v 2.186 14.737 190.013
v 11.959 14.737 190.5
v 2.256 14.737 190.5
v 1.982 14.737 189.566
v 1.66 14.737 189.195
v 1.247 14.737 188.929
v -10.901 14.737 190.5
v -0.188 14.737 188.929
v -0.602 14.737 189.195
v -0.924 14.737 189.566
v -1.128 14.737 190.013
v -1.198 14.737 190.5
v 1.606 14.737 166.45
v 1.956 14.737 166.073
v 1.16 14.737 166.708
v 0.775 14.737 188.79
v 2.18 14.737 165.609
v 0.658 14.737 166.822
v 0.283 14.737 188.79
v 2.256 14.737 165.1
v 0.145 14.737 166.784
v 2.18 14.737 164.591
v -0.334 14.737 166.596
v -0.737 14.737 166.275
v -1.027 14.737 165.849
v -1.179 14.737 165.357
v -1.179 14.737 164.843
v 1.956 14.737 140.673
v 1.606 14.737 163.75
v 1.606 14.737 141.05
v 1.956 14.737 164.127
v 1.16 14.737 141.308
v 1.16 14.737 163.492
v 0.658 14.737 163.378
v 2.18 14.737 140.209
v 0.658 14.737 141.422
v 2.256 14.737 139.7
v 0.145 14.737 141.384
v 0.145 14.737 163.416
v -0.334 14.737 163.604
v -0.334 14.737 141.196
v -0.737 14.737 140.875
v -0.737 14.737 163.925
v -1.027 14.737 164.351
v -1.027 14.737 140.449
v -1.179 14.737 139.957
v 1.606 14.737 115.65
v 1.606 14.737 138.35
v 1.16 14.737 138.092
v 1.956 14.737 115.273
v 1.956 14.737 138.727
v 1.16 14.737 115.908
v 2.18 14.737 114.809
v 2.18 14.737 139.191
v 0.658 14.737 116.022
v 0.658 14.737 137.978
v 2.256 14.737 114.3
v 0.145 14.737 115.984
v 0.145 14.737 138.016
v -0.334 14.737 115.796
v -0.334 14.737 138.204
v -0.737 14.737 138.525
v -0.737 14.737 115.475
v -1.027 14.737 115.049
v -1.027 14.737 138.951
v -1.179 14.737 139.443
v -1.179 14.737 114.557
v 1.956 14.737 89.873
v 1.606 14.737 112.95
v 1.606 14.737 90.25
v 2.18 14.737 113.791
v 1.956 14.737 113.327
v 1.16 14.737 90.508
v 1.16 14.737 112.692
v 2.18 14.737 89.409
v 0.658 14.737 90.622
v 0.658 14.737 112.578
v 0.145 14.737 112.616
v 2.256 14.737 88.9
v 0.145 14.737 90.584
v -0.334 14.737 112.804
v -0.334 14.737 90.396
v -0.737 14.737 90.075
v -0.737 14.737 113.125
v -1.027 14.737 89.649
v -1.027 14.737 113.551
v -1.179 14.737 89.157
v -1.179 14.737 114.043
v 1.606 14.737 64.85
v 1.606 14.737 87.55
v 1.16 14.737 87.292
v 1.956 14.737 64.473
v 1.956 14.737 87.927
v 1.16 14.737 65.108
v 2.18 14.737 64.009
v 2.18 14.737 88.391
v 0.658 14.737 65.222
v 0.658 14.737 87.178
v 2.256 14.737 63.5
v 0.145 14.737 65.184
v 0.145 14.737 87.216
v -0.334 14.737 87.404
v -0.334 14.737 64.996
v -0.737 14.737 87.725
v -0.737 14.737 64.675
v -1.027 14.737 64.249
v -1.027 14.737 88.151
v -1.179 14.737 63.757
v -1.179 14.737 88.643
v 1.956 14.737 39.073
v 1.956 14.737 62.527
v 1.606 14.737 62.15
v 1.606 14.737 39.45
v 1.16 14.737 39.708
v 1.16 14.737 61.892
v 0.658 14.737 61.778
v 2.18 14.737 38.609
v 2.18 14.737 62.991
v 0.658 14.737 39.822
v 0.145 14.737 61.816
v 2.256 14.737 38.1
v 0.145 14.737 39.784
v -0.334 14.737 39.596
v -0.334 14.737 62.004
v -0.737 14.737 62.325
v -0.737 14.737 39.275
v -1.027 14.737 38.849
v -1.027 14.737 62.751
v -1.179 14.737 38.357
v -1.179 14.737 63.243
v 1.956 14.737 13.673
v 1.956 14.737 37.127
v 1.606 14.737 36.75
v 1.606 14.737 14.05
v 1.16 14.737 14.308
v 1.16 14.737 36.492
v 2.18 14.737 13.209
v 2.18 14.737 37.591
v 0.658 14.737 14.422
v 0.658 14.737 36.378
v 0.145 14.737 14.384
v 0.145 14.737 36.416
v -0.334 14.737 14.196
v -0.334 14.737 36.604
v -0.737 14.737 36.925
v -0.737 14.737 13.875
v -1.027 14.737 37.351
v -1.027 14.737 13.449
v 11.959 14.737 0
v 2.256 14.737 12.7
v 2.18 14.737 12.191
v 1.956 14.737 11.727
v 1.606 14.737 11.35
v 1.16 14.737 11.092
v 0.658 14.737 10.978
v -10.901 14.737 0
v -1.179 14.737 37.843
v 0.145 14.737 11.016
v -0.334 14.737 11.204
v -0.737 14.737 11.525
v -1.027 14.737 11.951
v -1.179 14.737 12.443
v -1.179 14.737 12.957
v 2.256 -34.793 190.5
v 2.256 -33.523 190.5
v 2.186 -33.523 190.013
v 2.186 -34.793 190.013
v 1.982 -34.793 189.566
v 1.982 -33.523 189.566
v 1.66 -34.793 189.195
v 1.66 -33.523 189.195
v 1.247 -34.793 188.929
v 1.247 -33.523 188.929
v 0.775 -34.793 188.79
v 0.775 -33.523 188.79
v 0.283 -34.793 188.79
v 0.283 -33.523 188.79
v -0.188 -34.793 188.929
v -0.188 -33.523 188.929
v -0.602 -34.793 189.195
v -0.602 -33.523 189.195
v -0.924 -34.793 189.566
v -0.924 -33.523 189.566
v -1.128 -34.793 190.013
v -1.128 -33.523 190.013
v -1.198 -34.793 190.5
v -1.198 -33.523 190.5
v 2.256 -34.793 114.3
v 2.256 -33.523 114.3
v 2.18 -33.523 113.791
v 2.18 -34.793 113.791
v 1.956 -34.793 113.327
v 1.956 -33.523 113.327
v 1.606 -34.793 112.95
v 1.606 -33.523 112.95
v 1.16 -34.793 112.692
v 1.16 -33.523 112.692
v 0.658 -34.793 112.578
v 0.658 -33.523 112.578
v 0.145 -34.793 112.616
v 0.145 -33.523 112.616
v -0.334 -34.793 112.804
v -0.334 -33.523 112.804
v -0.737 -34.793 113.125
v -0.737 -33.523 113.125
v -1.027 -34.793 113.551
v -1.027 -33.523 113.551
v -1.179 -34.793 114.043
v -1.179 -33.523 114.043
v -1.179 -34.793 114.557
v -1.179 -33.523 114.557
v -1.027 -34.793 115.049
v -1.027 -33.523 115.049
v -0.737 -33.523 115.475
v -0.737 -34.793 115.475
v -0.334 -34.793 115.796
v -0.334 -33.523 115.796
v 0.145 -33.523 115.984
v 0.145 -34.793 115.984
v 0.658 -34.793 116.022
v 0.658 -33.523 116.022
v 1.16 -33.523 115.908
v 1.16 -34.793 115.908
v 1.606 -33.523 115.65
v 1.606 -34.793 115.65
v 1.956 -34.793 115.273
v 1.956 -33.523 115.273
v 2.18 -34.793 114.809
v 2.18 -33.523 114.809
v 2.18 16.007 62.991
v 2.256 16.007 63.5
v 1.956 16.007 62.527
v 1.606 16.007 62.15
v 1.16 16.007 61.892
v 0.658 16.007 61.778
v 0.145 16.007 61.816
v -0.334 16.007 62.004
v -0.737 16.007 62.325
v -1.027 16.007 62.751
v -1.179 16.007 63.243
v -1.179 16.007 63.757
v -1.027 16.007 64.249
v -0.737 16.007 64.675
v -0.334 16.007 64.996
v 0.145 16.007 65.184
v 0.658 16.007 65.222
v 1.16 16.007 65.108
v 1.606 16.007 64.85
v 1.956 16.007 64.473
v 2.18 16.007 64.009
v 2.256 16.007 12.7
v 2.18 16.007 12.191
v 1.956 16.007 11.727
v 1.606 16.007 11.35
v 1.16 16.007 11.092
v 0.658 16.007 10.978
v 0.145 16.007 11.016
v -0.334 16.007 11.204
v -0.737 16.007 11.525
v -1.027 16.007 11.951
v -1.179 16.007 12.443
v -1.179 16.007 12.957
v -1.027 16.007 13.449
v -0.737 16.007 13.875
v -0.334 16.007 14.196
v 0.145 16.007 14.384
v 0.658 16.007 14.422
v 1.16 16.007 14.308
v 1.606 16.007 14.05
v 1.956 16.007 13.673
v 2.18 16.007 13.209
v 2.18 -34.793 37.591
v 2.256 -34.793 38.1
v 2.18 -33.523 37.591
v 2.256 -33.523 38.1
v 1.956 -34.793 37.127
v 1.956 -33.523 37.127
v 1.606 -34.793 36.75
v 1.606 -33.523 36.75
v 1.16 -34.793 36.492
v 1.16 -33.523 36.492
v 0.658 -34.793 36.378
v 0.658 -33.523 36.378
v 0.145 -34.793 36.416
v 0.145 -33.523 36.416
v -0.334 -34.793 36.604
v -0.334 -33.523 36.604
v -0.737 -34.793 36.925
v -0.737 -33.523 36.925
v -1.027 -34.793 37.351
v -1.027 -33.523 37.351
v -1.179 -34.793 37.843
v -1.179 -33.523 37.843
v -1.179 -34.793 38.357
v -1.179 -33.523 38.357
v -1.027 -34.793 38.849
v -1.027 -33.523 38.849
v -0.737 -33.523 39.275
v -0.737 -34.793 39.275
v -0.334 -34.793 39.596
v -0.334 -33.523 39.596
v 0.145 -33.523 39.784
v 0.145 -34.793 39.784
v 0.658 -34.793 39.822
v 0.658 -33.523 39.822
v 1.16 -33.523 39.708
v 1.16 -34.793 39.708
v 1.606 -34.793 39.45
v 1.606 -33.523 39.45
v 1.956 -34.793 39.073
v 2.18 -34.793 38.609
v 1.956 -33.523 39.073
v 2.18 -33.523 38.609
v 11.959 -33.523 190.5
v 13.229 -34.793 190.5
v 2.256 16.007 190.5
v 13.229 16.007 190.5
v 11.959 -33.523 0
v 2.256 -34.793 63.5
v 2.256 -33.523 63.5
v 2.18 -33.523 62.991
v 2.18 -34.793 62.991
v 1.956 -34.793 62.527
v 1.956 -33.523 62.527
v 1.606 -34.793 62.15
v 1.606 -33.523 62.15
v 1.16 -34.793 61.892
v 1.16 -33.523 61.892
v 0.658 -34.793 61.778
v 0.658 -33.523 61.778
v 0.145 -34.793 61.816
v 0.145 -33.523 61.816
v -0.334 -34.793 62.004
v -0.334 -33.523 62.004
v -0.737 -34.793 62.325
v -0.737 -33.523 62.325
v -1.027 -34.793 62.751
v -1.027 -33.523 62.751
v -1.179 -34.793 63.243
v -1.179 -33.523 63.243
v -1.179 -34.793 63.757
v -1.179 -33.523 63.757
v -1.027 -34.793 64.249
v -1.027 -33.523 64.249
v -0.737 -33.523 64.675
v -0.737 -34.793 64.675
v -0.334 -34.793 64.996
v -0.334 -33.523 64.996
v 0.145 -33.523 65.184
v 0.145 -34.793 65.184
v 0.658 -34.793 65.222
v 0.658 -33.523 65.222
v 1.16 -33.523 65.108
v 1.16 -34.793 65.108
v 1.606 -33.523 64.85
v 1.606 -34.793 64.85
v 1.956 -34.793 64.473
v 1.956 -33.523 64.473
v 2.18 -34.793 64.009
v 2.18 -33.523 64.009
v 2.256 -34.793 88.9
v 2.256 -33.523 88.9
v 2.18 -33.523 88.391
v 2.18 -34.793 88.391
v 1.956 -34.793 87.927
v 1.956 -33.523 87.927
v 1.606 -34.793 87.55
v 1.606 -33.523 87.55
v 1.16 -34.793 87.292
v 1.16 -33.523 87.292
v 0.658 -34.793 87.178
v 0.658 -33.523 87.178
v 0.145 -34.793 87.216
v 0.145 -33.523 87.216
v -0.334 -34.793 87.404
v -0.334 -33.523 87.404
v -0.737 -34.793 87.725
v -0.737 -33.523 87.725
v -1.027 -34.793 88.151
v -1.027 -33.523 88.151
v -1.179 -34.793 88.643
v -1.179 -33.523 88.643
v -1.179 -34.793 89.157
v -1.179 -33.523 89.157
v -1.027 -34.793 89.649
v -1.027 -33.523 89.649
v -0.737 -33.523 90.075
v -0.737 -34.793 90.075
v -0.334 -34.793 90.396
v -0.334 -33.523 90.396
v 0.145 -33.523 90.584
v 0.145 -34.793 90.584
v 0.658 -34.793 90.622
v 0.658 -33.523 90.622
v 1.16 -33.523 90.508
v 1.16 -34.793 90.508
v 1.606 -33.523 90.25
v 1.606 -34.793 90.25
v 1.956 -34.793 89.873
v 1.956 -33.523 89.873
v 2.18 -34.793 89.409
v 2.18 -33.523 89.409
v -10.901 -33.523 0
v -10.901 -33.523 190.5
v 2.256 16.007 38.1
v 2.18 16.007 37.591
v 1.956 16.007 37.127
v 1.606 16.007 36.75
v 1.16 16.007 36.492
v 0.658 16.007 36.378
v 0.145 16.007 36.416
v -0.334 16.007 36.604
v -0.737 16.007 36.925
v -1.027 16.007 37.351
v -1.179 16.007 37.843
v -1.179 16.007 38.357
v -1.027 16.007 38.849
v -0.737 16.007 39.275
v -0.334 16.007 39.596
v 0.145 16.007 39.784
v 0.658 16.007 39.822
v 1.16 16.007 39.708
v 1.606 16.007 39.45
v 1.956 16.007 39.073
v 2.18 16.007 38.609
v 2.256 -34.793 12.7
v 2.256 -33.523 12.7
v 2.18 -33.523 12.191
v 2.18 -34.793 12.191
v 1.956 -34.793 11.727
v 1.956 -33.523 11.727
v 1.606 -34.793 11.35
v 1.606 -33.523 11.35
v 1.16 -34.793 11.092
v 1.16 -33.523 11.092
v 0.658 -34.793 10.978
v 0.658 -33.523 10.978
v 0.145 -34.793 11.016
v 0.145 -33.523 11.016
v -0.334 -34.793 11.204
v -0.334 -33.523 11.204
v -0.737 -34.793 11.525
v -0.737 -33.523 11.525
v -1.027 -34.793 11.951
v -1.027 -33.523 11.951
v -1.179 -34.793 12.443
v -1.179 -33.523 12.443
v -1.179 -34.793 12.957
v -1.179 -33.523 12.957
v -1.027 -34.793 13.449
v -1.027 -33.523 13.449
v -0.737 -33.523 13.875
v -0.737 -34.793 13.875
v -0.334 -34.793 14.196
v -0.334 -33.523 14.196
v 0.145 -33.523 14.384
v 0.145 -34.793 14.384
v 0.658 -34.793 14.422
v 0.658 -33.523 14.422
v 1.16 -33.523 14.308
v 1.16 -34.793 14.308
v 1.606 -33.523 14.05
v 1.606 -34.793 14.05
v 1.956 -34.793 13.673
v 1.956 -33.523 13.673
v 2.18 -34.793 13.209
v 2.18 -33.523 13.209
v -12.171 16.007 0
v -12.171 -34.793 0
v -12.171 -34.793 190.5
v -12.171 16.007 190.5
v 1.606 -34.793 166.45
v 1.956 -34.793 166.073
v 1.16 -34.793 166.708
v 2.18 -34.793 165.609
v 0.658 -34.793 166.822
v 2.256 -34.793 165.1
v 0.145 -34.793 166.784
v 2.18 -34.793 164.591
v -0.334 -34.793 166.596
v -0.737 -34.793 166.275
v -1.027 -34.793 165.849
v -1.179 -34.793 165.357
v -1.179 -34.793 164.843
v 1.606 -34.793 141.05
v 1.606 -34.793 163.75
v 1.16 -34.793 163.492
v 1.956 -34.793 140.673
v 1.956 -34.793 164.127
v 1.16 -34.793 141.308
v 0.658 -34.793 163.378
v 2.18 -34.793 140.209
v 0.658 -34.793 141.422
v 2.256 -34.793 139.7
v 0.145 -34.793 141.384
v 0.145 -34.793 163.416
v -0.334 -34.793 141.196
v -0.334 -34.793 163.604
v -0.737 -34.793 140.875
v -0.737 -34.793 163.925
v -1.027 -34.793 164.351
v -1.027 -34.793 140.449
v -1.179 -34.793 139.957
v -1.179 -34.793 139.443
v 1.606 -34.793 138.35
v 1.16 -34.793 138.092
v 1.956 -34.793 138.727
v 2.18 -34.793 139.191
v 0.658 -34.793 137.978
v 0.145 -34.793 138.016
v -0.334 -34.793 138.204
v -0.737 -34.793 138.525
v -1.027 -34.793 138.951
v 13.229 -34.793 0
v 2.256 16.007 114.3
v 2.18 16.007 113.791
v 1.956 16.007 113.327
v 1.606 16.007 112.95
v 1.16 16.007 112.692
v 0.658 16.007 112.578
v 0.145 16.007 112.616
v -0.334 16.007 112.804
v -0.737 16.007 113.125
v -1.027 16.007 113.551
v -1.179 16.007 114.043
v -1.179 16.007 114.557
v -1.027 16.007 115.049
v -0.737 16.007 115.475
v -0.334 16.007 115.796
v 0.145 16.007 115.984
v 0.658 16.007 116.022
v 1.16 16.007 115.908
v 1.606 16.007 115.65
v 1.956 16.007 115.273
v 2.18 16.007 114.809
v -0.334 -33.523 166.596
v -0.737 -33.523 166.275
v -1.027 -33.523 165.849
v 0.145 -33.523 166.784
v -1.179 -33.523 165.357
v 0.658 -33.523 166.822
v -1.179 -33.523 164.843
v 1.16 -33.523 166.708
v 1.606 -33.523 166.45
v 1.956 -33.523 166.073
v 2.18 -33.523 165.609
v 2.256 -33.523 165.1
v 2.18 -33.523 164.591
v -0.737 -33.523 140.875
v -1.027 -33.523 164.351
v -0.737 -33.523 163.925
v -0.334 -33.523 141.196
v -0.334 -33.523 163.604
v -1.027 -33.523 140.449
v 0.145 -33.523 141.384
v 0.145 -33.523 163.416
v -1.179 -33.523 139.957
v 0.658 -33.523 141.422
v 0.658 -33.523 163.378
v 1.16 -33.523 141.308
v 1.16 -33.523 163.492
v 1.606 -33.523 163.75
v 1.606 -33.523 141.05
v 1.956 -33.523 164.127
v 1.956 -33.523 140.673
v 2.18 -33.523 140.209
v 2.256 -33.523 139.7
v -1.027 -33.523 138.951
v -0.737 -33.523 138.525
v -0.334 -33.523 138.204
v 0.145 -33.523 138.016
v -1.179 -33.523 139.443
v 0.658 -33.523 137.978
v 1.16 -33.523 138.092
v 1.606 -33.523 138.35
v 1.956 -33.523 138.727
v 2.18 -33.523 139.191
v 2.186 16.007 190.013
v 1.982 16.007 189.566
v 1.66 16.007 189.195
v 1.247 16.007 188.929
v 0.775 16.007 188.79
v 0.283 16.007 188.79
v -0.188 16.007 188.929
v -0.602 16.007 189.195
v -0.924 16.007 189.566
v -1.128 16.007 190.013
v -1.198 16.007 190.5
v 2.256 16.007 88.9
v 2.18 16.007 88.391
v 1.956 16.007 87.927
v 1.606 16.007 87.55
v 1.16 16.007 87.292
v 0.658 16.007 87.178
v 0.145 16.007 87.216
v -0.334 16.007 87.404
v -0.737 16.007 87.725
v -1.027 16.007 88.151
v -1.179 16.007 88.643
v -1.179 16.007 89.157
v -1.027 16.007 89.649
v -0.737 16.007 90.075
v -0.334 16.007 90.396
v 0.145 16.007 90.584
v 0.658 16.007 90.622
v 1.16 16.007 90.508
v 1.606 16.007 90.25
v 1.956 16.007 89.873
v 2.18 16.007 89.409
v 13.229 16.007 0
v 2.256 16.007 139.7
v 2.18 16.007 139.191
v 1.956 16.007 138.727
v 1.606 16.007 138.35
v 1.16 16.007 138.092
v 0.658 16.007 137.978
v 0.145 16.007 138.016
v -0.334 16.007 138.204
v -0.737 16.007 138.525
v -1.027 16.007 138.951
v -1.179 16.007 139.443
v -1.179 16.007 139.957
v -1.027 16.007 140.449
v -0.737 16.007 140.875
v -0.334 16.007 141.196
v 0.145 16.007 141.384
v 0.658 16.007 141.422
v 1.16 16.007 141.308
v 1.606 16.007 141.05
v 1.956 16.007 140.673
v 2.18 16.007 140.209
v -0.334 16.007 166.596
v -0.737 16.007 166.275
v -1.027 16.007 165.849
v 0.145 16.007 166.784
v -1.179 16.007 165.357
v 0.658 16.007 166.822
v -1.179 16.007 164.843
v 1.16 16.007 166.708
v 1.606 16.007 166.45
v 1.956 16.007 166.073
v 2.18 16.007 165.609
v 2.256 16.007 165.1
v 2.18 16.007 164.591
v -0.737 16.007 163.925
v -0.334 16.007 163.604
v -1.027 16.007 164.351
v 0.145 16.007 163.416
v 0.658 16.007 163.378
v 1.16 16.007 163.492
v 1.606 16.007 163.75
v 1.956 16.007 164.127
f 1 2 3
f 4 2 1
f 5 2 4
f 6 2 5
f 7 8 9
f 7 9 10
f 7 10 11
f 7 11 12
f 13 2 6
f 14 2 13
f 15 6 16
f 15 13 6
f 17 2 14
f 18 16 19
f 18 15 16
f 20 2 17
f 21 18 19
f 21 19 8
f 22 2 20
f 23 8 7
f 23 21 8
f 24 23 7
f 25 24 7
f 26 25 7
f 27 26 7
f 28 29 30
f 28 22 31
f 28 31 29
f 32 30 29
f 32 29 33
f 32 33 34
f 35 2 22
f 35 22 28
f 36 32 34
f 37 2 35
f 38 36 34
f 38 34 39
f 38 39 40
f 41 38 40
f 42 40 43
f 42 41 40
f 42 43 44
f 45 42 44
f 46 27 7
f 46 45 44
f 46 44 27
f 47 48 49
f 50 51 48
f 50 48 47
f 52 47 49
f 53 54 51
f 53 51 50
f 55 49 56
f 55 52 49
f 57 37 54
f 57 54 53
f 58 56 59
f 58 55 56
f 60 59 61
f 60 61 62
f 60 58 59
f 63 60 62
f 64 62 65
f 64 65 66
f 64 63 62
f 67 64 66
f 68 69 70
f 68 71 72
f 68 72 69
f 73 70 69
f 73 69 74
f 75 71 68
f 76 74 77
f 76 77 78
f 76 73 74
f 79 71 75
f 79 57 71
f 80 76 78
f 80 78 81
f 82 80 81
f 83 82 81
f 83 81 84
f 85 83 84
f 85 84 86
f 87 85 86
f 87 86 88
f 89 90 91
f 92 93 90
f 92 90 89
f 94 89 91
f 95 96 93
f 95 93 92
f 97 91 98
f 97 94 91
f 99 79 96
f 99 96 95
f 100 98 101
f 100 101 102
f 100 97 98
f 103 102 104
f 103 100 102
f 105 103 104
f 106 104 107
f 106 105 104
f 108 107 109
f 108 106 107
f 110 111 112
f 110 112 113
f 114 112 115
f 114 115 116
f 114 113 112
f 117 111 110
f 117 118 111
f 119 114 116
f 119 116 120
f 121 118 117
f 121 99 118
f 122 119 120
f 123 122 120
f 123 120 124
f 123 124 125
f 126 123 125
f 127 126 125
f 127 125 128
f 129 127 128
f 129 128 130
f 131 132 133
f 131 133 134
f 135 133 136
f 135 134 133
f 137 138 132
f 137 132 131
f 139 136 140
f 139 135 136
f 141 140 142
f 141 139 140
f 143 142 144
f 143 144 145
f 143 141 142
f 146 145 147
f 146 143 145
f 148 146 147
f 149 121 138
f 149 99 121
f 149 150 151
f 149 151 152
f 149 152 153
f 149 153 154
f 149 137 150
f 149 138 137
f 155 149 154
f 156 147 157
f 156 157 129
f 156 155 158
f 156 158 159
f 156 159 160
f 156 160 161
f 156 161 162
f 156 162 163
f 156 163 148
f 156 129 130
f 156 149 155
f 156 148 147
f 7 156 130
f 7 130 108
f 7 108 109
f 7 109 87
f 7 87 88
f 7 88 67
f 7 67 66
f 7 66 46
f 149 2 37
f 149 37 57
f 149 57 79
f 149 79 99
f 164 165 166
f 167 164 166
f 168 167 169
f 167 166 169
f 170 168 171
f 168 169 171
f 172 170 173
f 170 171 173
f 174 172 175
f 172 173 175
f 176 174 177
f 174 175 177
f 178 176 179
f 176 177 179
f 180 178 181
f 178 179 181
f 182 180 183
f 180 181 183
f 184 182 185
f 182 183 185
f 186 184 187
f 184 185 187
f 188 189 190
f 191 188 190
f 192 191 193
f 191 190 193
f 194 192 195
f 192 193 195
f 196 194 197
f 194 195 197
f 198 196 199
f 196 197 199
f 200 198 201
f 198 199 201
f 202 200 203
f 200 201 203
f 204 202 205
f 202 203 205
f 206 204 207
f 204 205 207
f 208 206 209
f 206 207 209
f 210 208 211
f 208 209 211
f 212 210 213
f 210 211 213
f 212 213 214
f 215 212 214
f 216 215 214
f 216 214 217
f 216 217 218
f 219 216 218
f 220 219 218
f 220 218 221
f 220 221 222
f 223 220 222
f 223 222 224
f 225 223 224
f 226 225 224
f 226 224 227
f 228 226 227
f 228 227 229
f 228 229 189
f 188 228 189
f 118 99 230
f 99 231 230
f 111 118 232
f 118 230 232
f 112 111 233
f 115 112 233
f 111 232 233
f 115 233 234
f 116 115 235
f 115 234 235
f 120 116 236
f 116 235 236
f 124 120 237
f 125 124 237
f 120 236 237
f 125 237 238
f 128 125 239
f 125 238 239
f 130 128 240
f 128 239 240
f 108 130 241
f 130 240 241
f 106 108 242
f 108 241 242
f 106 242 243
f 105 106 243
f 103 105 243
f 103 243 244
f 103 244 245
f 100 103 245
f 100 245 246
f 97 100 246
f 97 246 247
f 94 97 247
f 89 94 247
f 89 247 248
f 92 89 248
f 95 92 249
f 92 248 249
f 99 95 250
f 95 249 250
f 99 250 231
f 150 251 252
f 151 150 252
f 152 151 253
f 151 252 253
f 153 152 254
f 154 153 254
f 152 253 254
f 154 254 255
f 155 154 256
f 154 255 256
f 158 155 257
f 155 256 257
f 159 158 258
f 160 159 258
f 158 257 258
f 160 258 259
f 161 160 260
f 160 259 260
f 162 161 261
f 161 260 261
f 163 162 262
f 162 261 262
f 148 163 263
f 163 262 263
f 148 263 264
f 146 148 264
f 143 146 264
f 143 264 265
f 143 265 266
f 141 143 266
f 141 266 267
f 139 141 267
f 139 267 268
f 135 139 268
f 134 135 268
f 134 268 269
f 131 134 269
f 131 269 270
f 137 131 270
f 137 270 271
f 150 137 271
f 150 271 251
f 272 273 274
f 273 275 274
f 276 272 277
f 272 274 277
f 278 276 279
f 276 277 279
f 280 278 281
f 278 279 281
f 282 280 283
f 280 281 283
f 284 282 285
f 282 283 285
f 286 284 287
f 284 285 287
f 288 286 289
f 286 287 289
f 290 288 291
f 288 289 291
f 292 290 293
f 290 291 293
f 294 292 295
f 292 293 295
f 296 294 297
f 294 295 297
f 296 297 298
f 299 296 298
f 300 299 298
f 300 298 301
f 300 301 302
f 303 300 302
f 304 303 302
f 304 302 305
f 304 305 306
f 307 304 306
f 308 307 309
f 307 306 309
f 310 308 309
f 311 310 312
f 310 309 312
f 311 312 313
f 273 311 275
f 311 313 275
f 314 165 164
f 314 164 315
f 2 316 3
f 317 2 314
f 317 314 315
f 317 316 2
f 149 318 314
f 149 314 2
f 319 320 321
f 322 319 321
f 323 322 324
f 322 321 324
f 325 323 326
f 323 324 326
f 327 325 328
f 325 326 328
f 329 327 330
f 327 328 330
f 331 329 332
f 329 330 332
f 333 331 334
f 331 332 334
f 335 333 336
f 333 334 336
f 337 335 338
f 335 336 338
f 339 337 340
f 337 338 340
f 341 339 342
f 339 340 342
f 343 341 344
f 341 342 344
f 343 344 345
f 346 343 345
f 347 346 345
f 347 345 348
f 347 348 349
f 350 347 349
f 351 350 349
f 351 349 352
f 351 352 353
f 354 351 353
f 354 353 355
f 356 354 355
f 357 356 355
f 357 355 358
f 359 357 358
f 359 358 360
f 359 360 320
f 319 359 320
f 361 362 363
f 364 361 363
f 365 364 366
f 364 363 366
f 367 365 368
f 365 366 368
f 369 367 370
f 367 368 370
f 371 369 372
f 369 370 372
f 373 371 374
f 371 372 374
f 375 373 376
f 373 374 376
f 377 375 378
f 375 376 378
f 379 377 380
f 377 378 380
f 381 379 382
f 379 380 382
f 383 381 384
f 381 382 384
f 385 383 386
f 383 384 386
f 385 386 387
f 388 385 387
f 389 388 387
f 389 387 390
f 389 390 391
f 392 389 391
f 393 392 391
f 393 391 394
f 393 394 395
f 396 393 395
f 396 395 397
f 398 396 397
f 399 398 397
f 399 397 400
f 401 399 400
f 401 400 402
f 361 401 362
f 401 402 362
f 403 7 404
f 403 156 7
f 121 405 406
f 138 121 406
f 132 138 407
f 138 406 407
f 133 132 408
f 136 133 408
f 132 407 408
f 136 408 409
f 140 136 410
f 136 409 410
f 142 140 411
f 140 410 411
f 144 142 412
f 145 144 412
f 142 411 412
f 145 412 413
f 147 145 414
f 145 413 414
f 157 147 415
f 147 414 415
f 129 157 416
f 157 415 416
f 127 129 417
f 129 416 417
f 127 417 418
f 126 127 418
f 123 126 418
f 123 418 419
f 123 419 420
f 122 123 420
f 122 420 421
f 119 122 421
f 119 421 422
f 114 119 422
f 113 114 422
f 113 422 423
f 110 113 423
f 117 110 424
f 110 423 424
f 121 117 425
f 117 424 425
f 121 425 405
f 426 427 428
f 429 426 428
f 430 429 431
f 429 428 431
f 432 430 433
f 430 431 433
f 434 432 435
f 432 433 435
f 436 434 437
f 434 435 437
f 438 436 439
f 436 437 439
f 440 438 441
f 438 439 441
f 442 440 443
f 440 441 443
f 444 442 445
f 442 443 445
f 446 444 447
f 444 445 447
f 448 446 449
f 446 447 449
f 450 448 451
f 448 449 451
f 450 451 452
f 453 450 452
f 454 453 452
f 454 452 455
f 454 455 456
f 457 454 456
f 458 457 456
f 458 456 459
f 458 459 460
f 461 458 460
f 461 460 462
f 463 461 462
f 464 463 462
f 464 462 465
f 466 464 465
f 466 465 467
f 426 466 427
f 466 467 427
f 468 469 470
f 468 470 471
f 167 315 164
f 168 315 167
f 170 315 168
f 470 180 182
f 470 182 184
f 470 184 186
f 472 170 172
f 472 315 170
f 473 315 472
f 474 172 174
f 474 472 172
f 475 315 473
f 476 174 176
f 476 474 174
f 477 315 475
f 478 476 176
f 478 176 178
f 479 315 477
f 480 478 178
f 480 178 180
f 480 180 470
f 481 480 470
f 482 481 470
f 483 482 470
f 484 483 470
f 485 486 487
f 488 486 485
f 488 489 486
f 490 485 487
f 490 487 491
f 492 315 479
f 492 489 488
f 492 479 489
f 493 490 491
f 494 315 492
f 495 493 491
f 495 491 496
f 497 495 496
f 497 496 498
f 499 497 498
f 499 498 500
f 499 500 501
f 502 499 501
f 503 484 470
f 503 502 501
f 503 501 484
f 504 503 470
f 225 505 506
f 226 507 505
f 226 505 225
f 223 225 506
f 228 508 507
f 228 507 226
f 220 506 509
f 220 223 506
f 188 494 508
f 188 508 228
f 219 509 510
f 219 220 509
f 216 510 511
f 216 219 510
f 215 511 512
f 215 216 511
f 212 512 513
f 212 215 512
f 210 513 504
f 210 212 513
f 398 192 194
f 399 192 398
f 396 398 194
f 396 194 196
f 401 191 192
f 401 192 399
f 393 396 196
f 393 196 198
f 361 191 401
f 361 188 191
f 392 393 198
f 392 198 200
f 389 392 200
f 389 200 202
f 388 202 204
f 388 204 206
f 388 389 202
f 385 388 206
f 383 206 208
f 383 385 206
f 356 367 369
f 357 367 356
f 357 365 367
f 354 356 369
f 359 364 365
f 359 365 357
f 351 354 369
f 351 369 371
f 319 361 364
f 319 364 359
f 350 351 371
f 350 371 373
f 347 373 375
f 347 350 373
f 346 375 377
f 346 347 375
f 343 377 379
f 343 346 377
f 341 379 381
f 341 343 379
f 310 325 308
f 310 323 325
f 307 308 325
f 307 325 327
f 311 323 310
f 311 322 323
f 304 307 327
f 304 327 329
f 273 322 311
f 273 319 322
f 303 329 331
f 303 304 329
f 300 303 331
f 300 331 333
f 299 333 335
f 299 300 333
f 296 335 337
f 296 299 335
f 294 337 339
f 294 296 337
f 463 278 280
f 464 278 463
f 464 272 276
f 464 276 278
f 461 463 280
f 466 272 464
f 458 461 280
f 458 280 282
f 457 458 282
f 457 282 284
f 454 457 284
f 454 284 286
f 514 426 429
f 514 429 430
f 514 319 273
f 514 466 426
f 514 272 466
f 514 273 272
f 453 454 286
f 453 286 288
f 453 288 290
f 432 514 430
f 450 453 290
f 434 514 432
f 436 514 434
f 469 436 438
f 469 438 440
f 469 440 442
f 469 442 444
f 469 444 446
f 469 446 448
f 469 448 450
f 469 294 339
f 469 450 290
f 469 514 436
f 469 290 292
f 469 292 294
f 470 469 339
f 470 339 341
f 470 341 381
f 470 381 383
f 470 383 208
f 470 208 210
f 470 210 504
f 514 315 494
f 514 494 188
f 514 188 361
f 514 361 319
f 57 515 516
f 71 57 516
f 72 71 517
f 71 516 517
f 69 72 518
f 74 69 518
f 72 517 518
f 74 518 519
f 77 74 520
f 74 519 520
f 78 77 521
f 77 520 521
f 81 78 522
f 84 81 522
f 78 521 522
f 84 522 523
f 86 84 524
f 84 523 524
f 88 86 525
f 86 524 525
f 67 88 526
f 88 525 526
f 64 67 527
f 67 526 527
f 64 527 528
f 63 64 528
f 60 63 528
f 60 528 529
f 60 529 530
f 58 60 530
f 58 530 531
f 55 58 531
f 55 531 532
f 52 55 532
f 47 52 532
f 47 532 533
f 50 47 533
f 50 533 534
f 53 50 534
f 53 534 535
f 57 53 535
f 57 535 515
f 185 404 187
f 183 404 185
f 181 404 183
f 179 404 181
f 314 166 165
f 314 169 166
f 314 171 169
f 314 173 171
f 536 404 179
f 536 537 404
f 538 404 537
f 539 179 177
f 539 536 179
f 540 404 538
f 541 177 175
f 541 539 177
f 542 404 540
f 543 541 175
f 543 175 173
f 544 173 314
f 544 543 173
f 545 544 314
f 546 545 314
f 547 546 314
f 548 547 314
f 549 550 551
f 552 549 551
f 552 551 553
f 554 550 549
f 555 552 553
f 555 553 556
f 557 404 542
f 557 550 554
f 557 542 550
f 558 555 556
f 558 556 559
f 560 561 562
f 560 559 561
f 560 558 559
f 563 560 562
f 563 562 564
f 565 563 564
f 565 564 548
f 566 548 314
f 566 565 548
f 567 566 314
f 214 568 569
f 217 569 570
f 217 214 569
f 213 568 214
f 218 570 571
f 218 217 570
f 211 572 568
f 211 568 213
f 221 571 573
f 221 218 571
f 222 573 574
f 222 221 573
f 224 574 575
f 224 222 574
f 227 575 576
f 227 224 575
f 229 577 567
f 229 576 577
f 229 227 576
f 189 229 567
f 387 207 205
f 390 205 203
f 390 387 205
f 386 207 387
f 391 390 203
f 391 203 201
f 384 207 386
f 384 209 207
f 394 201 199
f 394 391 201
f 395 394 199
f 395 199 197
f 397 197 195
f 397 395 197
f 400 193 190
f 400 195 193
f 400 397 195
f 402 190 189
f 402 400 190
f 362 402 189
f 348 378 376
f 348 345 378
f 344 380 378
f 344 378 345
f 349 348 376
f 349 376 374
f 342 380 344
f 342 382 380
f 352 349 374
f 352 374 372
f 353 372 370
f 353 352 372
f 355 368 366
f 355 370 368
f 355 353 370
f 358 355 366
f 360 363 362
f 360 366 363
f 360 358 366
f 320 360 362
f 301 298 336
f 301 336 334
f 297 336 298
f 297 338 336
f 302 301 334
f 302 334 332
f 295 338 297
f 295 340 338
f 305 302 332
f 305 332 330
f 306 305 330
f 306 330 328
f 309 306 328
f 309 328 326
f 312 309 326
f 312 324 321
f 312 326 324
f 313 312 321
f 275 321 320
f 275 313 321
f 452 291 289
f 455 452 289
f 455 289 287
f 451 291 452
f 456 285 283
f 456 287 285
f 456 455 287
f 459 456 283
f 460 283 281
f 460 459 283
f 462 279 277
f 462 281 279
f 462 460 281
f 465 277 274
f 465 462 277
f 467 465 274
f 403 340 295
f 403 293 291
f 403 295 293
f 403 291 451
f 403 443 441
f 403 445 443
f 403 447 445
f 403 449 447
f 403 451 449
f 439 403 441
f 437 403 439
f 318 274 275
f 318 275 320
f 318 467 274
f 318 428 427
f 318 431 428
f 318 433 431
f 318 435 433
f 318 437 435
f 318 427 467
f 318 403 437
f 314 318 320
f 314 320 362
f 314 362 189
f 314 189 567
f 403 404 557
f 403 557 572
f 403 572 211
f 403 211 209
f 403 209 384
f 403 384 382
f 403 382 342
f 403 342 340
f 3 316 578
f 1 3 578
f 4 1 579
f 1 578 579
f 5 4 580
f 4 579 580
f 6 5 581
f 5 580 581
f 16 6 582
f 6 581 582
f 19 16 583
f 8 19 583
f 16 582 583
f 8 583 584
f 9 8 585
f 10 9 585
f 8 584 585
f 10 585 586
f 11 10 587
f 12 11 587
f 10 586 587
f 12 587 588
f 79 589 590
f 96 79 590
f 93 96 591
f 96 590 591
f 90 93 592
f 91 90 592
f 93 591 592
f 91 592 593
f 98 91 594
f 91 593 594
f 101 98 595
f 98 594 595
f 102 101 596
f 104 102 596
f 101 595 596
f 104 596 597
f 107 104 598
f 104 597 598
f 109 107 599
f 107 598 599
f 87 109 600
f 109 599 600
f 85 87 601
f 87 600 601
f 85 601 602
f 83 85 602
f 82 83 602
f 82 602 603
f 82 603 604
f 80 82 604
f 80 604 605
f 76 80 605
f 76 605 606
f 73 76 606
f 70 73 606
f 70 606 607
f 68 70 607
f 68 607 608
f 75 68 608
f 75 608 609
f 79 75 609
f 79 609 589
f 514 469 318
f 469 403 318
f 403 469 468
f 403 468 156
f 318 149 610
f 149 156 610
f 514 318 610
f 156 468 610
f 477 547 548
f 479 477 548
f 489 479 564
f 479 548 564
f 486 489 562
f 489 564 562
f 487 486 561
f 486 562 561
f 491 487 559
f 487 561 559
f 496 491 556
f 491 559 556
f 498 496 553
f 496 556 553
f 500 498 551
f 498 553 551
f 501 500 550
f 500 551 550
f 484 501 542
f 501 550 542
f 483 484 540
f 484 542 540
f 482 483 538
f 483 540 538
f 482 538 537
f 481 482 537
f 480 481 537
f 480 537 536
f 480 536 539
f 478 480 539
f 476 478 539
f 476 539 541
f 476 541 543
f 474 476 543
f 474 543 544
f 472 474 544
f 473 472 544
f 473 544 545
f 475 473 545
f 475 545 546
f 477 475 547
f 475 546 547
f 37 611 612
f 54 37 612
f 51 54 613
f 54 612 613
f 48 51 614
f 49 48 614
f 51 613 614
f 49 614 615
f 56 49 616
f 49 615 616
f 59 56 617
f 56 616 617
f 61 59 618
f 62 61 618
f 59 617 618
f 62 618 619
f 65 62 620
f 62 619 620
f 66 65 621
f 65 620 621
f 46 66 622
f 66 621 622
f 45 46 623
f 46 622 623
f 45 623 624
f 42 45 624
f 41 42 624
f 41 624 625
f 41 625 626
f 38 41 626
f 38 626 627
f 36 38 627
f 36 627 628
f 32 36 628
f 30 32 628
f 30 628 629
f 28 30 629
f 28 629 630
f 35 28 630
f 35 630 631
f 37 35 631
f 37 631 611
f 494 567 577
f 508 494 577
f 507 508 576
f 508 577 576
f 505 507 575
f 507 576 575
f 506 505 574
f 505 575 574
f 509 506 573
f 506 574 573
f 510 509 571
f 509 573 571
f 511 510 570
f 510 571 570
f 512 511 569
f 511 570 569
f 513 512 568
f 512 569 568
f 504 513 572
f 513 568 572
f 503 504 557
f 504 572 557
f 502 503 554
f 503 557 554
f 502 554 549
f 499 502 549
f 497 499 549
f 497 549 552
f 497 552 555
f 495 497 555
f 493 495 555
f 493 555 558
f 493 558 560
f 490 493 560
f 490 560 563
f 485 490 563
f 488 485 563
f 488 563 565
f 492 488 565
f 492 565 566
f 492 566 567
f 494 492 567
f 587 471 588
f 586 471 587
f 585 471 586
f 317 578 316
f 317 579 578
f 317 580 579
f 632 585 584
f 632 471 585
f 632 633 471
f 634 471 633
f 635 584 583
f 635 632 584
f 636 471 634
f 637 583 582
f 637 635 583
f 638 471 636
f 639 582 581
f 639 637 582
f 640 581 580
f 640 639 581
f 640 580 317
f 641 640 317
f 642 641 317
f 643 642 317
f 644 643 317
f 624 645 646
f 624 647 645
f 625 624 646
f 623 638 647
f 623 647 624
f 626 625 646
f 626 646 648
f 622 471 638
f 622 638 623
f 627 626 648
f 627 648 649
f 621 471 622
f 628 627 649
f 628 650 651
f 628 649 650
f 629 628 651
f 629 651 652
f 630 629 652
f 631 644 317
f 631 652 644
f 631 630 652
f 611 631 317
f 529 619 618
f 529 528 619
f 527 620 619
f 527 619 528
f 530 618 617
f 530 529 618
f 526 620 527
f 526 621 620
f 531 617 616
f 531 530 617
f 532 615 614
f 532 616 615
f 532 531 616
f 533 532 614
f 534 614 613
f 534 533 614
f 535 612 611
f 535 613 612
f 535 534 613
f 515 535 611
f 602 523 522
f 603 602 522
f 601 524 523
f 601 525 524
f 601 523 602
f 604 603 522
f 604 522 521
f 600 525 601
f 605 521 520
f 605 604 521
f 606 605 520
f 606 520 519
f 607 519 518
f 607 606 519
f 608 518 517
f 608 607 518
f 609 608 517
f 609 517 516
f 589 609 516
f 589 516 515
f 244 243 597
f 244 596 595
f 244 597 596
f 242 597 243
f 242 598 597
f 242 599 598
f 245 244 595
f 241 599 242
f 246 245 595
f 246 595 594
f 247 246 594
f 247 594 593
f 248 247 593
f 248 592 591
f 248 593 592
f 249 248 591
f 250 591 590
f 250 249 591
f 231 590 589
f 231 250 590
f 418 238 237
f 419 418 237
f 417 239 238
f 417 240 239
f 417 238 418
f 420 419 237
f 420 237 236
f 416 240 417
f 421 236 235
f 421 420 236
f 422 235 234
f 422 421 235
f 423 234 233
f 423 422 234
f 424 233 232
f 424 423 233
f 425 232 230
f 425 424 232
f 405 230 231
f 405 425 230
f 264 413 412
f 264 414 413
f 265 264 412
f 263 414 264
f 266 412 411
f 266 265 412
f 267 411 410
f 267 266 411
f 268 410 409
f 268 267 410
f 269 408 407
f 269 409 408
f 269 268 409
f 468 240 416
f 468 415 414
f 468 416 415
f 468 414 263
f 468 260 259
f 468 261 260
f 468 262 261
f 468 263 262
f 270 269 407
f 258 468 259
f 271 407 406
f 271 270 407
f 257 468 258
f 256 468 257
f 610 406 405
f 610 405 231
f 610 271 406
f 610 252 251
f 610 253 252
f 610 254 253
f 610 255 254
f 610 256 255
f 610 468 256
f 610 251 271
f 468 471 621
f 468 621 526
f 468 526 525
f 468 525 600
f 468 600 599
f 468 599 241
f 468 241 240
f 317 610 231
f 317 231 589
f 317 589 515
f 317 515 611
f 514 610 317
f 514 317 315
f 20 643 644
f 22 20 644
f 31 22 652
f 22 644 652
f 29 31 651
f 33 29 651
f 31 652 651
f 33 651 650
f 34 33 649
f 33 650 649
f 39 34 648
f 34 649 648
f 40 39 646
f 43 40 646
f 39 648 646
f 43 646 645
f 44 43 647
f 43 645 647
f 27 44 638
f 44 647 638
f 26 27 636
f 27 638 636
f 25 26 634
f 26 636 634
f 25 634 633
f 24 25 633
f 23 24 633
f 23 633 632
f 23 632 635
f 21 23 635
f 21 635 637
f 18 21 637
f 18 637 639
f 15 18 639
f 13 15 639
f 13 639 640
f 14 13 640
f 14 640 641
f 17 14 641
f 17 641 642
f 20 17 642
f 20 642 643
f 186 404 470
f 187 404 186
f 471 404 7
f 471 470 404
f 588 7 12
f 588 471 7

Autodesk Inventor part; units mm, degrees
ref_plane "YZ Plane" through (0, 0, 0) normal (1, 0, 0) x (0, 1, 0)
ref_plane "XZ Plane" through (0, 0, 0) normal (0, 1, 0) x (-1, 0, 0)
ref_plane "XY Plane" through (0, 0, 0) normal (0, 0, 1) x (1, 0, 0)
sketch "Sketch1" plane through (0, 0, 0) normal (0, 0, 1) x (1, 0, 0)
  line L0 (-12.1708, 16.0073) -> (13.2292, 16.0073)
  line L1 (13.2292, 16.0073) -> (13.2292, -34.7927)
  line L2 (13.2292, -34.7927) -> (-12.1708, -34.7927)
  line L3 (-12.1708, -34.7927) -> (-12.1708, 16.0073)
  line L4 (11.9592, 14.7373) -> (-10.9008, 14.7373)
  line L5 (-10.9008, 14.7373) -> (-10.9008, -33.5227)
  line L6 (-10.9008, -33.5227) -> (11.9592, -33.5227)
  line L7 (11.9592, -33.5227) -> (11.9592, 14.7373)
  point P0 (0, 0)
  dimension "d0" = 25.4
  dimension "d1" = 50.8
  dimension "d2" = 1.27
extrude "Extrusion1" add sketch "Sketch1" along normal blind 190.5
sketch "Sketch2" plane through (-12.1708, 16.0073, 0) normal (0, 1, 0) x (1, 0, 0)
  circle A0 centre (12.7, -12.7) radius 1.7272
  line L0 (25.4, 0) -> (0, 0) projected
  line L1 (0, 0) -> (0, -190.5) projected
  point P0 (12.1708, 0)
  dimension "d5" = 3.4544
  dimension "d6" = 12.7
  dimension "d7" = 12.7
extrude "Extrusion2" cut sketch "Sketch2" against normal through all
pattern_linear "Rectangular Pattern1" count 19 spacing 25.4 along (0, 0, 1) of "Extrusion2"
sketch "Sketch5" plane through (-12.1708, -34.7927, 0) normal (-1, 0, 0) x (0, 0, 1)
  line L0 (0, 50.8) -> (0, 0) projected
  line L1 (139.7, 50.8) -> (190.5, 50.8)
  line L2 (190.5, 50.8) -> (190.5, 203.2)
  line L3 (190.5, 203.2) -> (139.7, 203.2)
  line L4 (139.7, 203.2) -> (139.7, 50.8)
  circle A0 centre (165.1, 101.6) radius 14.2875
  point P0 (0, 34.7927)
  point P1 (165.1, 50.8)
  dimension "d48" = 50.8
  dimension "d49" = 152.4
  dimension "d50" = 28.575
  dimension "d51" = 50.8
equation "\"d3\" = d13"
equation "\"d10\" = d14"
equation "\"d13\" = 190.5"
equation "\"d14\" = d13"
equation "\"d32\" = 101.6"
properties part number "ElevatorPivotBar2"
